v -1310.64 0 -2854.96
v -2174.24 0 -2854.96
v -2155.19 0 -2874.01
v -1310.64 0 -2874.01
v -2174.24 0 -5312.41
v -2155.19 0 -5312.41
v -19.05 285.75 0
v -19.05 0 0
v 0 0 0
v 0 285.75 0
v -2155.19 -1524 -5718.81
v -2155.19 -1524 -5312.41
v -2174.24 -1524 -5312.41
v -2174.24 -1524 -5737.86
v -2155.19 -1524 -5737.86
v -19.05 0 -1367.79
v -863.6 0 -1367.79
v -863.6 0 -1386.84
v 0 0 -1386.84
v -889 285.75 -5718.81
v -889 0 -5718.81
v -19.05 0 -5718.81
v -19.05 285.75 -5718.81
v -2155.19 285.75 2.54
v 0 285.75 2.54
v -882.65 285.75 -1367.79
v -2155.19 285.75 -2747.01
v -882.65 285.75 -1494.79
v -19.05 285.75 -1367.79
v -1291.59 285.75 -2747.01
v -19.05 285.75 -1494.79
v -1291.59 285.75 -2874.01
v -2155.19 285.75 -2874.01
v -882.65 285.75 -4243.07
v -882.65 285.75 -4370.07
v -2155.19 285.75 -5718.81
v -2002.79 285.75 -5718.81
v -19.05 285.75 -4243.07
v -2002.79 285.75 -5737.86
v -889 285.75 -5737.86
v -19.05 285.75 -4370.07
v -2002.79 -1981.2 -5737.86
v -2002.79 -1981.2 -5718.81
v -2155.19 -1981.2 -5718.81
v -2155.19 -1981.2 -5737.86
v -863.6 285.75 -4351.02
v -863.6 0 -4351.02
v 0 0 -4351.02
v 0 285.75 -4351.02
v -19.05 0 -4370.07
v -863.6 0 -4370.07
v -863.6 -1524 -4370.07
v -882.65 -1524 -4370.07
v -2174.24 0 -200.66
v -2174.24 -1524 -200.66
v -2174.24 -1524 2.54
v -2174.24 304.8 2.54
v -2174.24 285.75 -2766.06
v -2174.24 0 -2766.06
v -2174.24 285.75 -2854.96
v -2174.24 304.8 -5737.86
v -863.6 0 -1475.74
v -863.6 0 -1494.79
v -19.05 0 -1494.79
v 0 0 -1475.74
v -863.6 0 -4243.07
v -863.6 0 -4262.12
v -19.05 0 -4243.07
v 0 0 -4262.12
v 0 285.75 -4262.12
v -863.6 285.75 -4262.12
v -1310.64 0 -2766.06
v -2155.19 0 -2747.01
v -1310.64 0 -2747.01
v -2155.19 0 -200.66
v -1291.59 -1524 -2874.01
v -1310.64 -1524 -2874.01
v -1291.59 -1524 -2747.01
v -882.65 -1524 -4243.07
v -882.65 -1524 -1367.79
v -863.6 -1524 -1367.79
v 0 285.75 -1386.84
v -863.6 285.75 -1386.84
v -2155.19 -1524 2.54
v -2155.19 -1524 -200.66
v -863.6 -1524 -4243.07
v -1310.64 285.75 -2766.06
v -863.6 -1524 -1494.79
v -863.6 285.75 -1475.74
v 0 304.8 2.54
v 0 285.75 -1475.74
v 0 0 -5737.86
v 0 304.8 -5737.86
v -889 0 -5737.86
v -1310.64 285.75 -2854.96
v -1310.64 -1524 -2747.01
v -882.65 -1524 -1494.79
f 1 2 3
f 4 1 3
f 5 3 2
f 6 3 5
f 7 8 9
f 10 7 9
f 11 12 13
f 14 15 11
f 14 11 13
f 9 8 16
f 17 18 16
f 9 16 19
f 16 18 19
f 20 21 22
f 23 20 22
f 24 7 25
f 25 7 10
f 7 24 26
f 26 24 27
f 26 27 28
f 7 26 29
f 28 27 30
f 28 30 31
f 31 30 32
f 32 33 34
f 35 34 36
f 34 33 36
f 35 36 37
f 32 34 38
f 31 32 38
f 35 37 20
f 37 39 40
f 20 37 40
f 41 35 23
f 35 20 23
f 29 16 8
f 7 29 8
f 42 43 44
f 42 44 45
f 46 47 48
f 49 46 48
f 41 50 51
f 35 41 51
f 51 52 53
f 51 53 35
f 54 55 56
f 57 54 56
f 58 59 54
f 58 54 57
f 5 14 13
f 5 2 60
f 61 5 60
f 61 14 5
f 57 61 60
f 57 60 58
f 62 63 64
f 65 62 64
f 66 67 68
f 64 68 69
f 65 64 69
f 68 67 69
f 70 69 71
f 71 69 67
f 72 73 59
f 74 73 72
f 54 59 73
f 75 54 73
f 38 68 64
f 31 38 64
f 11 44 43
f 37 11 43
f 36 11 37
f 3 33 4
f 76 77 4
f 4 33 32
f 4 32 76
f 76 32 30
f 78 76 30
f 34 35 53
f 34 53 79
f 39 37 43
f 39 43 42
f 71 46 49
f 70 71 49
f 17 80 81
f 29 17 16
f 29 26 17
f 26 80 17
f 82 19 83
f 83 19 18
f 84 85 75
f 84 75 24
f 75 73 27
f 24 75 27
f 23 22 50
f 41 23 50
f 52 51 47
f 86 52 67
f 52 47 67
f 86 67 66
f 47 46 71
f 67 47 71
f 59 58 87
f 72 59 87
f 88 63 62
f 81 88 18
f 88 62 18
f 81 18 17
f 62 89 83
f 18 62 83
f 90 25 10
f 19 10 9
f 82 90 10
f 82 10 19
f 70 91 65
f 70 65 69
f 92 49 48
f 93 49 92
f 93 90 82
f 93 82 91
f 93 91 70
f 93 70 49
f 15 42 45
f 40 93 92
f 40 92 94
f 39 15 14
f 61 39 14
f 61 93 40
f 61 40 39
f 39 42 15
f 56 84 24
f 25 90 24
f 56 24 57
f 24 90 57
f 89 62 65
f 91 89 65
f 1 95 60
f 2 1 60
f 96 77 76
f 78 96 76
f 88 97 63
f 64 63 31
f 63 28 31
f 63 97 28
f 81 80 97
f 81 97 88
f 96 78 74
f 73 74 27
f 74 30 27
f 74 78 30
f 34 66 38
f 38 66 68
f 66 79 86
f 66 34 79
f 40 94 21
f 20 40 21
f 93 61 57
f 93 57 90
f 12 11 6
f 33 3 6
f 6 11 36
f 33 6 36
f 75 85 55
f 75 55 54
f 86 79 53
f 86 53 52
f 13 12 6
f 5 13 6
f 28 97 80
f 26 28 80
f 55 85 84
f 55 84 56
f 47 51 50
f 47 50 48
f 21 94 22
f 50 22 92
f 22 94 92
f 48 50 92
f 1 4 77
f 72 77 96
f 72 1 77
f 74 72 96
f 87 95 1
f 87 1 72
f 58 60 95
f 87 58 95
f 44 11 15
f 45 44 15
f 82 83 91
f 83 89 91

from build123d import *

# Parameters (mm, degrees)
BOSS_EXTRUDE1_DEPTH = 304.8
SKETCH2_W           = 2174.24
SKETCH2_H           = 5740.4
BOSS_EXTRUDE2_DEPTH = 19.05
BOSS_EXTRUDE3_DEPTH = 285.75
SKETCH4_W           = 19.05
SKETCH4_H           = 127
BOSS_EXTRUDE4_DEPTH = 1524
SKETCH5_W           = 19.05
SKETCH5_H           = 2286
BOSS_EXTRUDE5_DEPTH = 152.4
SKETCH6_W           = 19.05
SKETCH6_H           = 1524
BOSS_EXTRUDE6_DEPTH = 5740.4
SKETCH7_W           = 5111.75
SKETCH7_H           = 1524
CUT_EXTRUDE1_DEPTH  = 6442.508732875


with BuildPart() as part:
    # Sketch1 → Boss-Extrude1 (new body)
    with BuildSketch(Plane(origin=(0, 0, 0), x_dir=(1, 0, 0), z_dir=(0, 1, 0))):
        Polygon((0, 0), (0, 1386.84), (-863.6, 1386.84), (-863.6, 1475.74), (0, 1475.74), (0, 4262.12), (-863.6, 4262.12), (-863.6, 4351.02), (0, 4351.02), (0, 5737.86), (-889, 5737.86), (-889, 5718.81), (-19.05, 5718.81), (-19.05, 4370.07), (-882.65, 4370.07), (-882.65, 4243.07), (-19.05, 4243.07), (-19.05, 1494.79), (-882.65, 1494.79), (-882.65, 1367.79), (-19.05, 1367.79), (-19.05, 0), align=None)
    extrude(amount=BOSS_EXTRUDE1_DEPTH)

    # Sketch2 → Boss-Extrude2 (add)
    with BuildSketch(Plane(origin=(0, 304.8, 0), x_dir=(1, 0, 0), z_dir=(0, 1, 0))):
        with Locations((-1087.12, 2867.66)):
            Rectangle(SKETCH2_W, SKETCH2_H)
    extrude(amount=-BOSS_EXTRUDE2_DEPTH)

    # Sketch3 → Boss-Extrude3 (add)
    with BuildSketch(Plane.XZ.offset(-285.75)):
        Polygon((-2174.24, 2.54), (-2174.24, -2766.06), (-1310.64, -2766.06), (-1310.64, -2854.96), (-2174.24, -2854.96), (-2174.24, -5737.86), (-2155.19, -5737.86), (-2155.19, -2874.01), (-1291.59, -2874.01), (-1291.59, -2747.01), (-2155.19, -2747.01), (-2155.19, 2.54), align=None)
    extrude(amount=BOSS_EXTRUDE3_DEPTH)

    # Sketch4 → Boss-Extrude4 (add)
    with BuildSketch(Plane.XZ):
        with Locations((-873.125, -1431.29)):
            Rectangle(SKETCH4_W, SKETCH4_H)
        with Locations((-1301.115, -2810.51)):
            Rectangle(SKETCH4_W, SKETCH4_H)
        with Locations((-873.125, -4306.57)):
            Rectangle(SKETCH4_W, SKETCH4_H)
    extrude(amount=BOSS_EXTRUDE4_DEPTH)

    # Sketch5 → Boss-Extrude5 (add)
    with BuildSketch(Plane(origin=(-2155.19, 0, 0), x_dir=(0, 0, -1), z_dir=(1, 0, 0))):
        with Locations((5728.335, -838.2)):
            Rectangle(SKETCH5_W, SKETCH5_H)
    extrude(amount=BOSS_EXTRUDE5_DEPTH)

    # Sketch6 → Boss-Extrude6 (add)
    with BuildSketch(Plane(origin=(0, 0, -5737.86), x_dir=(-1, 0, 0), z_dir=(0, 0, -1))):
        with Locations((2164.715, -762)):
            Rectangle(SKETCH6_W, SKETCH6_H)
    extrude(amount=-BOSS_EXTRUDE6_DEPTH)

    # Sketch7 → Cut-Extrude1 (cut, through all)
    with BuildSketch(Plane(origin=(-2155.19, 0, 0), x_dir=(0, 0, -1), z_dir=(1, 0, 0))):
        with Locations((2756.535, -762)):
            Rectangle(SKETCH7_W, SKETCH7_H)
    extrude(amount=-CUT_EXTRUDE1_DEPTH, mode=Mode.SUBTRACT)


solid = part.part
